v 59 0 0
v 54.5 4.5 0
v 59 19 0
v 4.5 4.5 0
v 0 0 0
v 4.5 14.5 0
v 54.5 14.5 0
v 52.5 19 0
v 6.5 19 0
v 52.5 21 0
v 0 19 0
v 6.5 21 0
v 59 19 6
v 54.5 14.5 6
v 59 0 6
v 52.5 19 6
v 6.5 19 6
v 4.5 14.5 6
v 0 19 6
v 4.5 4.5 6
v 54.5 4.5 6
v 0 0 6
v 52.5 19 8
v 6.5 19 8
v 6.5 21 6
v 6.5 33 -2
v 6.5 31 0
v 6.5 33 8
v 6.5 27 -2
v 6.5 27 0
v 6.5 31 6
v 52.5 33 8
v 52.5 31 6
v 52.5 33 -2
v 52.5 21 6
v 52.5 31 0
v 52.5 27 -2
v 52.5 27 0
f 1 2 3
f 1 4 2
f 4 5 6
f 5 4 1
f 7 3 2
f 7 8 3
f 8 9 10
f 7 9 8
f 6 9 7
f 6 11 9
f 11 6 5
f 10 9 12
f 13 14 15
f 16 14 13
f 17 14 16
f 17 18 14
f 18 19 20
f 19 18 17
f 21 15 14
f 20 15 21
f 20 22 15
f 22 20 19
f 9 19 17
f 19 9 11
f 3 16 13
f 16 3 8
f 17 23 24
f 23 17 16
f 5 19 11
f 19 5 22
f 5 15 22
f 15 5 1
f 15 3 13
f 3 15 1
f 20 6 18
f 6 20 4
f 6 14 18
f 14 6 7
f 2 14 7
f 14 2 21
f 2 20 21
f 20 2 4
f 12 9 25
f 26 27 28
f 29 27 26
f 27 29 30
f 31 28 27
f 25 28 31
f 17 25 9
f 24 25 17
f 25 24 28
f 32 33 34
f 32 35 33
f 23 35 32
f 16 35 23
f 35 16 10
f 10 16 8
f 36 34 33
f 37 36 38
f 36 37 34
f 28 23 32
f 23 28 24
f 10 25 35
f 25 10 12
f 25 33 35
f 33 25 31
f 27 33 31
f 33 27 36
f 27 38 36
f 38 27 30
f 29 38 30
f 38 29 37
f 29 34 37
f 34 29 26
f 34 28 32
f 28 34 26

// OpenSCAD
$fn = 60;

// BeltHook：环形穿带扣
// 环：完整矩形环，内开口 50x10，壁厚 4.5，Z 宽 6.0
// C 形钩（开口朝下 ⊓）：横臂在顶（Z=6→8），竖臂（近端）和断臂+回钩（远端）都向下；
//   侧视（YZ 截面）：开口朝 -Z（向下），线厚 2，
//   竖臂高 8（Z=0→8，底部对齐环底面 Z=0，顶部突出环顶面 Z=6）；
//   远端断臂深 4（Z=2→6）+ 回钩深 4（Z=-2→2）+ 朝环回钩节深 4（Y=31→27，Z=-2→0），钩口宽 10；
//   竖臂外缘与环外边缘（Y=19）对齐；钩子沿环长边方向（X）总宽 46
union() {
    // 环
    linear_extrude(height = 6)
    difference() {
        square([59, 19]);
        translate([4.5, 4.5]) square([50, 10]);
    }

    // 钩子：截面在 YZ 平面，沿环长边方向（X）挤出 46，居中（偏移 (59-46)/2=6.5）
    translate([6.5, 19, 0])
    rotate([90, 0, 90])
    linear_extrude(height = 46)
    polygon([
        [0,8], [14,8], [14,-2], [8,-2], [8,0], [12,0], [12,6], [2,6],    // 横臂顶 + 外缘（Z=8→-2）+ 朝环回钩节（底Y=33→27，深4）+ 断臂内缘
        [2,0], [0,0]                                        // 竖臂内缘（高8，Z=6→0）+ 竖臂底（对齐环底面Z=0）
    ]);
}
